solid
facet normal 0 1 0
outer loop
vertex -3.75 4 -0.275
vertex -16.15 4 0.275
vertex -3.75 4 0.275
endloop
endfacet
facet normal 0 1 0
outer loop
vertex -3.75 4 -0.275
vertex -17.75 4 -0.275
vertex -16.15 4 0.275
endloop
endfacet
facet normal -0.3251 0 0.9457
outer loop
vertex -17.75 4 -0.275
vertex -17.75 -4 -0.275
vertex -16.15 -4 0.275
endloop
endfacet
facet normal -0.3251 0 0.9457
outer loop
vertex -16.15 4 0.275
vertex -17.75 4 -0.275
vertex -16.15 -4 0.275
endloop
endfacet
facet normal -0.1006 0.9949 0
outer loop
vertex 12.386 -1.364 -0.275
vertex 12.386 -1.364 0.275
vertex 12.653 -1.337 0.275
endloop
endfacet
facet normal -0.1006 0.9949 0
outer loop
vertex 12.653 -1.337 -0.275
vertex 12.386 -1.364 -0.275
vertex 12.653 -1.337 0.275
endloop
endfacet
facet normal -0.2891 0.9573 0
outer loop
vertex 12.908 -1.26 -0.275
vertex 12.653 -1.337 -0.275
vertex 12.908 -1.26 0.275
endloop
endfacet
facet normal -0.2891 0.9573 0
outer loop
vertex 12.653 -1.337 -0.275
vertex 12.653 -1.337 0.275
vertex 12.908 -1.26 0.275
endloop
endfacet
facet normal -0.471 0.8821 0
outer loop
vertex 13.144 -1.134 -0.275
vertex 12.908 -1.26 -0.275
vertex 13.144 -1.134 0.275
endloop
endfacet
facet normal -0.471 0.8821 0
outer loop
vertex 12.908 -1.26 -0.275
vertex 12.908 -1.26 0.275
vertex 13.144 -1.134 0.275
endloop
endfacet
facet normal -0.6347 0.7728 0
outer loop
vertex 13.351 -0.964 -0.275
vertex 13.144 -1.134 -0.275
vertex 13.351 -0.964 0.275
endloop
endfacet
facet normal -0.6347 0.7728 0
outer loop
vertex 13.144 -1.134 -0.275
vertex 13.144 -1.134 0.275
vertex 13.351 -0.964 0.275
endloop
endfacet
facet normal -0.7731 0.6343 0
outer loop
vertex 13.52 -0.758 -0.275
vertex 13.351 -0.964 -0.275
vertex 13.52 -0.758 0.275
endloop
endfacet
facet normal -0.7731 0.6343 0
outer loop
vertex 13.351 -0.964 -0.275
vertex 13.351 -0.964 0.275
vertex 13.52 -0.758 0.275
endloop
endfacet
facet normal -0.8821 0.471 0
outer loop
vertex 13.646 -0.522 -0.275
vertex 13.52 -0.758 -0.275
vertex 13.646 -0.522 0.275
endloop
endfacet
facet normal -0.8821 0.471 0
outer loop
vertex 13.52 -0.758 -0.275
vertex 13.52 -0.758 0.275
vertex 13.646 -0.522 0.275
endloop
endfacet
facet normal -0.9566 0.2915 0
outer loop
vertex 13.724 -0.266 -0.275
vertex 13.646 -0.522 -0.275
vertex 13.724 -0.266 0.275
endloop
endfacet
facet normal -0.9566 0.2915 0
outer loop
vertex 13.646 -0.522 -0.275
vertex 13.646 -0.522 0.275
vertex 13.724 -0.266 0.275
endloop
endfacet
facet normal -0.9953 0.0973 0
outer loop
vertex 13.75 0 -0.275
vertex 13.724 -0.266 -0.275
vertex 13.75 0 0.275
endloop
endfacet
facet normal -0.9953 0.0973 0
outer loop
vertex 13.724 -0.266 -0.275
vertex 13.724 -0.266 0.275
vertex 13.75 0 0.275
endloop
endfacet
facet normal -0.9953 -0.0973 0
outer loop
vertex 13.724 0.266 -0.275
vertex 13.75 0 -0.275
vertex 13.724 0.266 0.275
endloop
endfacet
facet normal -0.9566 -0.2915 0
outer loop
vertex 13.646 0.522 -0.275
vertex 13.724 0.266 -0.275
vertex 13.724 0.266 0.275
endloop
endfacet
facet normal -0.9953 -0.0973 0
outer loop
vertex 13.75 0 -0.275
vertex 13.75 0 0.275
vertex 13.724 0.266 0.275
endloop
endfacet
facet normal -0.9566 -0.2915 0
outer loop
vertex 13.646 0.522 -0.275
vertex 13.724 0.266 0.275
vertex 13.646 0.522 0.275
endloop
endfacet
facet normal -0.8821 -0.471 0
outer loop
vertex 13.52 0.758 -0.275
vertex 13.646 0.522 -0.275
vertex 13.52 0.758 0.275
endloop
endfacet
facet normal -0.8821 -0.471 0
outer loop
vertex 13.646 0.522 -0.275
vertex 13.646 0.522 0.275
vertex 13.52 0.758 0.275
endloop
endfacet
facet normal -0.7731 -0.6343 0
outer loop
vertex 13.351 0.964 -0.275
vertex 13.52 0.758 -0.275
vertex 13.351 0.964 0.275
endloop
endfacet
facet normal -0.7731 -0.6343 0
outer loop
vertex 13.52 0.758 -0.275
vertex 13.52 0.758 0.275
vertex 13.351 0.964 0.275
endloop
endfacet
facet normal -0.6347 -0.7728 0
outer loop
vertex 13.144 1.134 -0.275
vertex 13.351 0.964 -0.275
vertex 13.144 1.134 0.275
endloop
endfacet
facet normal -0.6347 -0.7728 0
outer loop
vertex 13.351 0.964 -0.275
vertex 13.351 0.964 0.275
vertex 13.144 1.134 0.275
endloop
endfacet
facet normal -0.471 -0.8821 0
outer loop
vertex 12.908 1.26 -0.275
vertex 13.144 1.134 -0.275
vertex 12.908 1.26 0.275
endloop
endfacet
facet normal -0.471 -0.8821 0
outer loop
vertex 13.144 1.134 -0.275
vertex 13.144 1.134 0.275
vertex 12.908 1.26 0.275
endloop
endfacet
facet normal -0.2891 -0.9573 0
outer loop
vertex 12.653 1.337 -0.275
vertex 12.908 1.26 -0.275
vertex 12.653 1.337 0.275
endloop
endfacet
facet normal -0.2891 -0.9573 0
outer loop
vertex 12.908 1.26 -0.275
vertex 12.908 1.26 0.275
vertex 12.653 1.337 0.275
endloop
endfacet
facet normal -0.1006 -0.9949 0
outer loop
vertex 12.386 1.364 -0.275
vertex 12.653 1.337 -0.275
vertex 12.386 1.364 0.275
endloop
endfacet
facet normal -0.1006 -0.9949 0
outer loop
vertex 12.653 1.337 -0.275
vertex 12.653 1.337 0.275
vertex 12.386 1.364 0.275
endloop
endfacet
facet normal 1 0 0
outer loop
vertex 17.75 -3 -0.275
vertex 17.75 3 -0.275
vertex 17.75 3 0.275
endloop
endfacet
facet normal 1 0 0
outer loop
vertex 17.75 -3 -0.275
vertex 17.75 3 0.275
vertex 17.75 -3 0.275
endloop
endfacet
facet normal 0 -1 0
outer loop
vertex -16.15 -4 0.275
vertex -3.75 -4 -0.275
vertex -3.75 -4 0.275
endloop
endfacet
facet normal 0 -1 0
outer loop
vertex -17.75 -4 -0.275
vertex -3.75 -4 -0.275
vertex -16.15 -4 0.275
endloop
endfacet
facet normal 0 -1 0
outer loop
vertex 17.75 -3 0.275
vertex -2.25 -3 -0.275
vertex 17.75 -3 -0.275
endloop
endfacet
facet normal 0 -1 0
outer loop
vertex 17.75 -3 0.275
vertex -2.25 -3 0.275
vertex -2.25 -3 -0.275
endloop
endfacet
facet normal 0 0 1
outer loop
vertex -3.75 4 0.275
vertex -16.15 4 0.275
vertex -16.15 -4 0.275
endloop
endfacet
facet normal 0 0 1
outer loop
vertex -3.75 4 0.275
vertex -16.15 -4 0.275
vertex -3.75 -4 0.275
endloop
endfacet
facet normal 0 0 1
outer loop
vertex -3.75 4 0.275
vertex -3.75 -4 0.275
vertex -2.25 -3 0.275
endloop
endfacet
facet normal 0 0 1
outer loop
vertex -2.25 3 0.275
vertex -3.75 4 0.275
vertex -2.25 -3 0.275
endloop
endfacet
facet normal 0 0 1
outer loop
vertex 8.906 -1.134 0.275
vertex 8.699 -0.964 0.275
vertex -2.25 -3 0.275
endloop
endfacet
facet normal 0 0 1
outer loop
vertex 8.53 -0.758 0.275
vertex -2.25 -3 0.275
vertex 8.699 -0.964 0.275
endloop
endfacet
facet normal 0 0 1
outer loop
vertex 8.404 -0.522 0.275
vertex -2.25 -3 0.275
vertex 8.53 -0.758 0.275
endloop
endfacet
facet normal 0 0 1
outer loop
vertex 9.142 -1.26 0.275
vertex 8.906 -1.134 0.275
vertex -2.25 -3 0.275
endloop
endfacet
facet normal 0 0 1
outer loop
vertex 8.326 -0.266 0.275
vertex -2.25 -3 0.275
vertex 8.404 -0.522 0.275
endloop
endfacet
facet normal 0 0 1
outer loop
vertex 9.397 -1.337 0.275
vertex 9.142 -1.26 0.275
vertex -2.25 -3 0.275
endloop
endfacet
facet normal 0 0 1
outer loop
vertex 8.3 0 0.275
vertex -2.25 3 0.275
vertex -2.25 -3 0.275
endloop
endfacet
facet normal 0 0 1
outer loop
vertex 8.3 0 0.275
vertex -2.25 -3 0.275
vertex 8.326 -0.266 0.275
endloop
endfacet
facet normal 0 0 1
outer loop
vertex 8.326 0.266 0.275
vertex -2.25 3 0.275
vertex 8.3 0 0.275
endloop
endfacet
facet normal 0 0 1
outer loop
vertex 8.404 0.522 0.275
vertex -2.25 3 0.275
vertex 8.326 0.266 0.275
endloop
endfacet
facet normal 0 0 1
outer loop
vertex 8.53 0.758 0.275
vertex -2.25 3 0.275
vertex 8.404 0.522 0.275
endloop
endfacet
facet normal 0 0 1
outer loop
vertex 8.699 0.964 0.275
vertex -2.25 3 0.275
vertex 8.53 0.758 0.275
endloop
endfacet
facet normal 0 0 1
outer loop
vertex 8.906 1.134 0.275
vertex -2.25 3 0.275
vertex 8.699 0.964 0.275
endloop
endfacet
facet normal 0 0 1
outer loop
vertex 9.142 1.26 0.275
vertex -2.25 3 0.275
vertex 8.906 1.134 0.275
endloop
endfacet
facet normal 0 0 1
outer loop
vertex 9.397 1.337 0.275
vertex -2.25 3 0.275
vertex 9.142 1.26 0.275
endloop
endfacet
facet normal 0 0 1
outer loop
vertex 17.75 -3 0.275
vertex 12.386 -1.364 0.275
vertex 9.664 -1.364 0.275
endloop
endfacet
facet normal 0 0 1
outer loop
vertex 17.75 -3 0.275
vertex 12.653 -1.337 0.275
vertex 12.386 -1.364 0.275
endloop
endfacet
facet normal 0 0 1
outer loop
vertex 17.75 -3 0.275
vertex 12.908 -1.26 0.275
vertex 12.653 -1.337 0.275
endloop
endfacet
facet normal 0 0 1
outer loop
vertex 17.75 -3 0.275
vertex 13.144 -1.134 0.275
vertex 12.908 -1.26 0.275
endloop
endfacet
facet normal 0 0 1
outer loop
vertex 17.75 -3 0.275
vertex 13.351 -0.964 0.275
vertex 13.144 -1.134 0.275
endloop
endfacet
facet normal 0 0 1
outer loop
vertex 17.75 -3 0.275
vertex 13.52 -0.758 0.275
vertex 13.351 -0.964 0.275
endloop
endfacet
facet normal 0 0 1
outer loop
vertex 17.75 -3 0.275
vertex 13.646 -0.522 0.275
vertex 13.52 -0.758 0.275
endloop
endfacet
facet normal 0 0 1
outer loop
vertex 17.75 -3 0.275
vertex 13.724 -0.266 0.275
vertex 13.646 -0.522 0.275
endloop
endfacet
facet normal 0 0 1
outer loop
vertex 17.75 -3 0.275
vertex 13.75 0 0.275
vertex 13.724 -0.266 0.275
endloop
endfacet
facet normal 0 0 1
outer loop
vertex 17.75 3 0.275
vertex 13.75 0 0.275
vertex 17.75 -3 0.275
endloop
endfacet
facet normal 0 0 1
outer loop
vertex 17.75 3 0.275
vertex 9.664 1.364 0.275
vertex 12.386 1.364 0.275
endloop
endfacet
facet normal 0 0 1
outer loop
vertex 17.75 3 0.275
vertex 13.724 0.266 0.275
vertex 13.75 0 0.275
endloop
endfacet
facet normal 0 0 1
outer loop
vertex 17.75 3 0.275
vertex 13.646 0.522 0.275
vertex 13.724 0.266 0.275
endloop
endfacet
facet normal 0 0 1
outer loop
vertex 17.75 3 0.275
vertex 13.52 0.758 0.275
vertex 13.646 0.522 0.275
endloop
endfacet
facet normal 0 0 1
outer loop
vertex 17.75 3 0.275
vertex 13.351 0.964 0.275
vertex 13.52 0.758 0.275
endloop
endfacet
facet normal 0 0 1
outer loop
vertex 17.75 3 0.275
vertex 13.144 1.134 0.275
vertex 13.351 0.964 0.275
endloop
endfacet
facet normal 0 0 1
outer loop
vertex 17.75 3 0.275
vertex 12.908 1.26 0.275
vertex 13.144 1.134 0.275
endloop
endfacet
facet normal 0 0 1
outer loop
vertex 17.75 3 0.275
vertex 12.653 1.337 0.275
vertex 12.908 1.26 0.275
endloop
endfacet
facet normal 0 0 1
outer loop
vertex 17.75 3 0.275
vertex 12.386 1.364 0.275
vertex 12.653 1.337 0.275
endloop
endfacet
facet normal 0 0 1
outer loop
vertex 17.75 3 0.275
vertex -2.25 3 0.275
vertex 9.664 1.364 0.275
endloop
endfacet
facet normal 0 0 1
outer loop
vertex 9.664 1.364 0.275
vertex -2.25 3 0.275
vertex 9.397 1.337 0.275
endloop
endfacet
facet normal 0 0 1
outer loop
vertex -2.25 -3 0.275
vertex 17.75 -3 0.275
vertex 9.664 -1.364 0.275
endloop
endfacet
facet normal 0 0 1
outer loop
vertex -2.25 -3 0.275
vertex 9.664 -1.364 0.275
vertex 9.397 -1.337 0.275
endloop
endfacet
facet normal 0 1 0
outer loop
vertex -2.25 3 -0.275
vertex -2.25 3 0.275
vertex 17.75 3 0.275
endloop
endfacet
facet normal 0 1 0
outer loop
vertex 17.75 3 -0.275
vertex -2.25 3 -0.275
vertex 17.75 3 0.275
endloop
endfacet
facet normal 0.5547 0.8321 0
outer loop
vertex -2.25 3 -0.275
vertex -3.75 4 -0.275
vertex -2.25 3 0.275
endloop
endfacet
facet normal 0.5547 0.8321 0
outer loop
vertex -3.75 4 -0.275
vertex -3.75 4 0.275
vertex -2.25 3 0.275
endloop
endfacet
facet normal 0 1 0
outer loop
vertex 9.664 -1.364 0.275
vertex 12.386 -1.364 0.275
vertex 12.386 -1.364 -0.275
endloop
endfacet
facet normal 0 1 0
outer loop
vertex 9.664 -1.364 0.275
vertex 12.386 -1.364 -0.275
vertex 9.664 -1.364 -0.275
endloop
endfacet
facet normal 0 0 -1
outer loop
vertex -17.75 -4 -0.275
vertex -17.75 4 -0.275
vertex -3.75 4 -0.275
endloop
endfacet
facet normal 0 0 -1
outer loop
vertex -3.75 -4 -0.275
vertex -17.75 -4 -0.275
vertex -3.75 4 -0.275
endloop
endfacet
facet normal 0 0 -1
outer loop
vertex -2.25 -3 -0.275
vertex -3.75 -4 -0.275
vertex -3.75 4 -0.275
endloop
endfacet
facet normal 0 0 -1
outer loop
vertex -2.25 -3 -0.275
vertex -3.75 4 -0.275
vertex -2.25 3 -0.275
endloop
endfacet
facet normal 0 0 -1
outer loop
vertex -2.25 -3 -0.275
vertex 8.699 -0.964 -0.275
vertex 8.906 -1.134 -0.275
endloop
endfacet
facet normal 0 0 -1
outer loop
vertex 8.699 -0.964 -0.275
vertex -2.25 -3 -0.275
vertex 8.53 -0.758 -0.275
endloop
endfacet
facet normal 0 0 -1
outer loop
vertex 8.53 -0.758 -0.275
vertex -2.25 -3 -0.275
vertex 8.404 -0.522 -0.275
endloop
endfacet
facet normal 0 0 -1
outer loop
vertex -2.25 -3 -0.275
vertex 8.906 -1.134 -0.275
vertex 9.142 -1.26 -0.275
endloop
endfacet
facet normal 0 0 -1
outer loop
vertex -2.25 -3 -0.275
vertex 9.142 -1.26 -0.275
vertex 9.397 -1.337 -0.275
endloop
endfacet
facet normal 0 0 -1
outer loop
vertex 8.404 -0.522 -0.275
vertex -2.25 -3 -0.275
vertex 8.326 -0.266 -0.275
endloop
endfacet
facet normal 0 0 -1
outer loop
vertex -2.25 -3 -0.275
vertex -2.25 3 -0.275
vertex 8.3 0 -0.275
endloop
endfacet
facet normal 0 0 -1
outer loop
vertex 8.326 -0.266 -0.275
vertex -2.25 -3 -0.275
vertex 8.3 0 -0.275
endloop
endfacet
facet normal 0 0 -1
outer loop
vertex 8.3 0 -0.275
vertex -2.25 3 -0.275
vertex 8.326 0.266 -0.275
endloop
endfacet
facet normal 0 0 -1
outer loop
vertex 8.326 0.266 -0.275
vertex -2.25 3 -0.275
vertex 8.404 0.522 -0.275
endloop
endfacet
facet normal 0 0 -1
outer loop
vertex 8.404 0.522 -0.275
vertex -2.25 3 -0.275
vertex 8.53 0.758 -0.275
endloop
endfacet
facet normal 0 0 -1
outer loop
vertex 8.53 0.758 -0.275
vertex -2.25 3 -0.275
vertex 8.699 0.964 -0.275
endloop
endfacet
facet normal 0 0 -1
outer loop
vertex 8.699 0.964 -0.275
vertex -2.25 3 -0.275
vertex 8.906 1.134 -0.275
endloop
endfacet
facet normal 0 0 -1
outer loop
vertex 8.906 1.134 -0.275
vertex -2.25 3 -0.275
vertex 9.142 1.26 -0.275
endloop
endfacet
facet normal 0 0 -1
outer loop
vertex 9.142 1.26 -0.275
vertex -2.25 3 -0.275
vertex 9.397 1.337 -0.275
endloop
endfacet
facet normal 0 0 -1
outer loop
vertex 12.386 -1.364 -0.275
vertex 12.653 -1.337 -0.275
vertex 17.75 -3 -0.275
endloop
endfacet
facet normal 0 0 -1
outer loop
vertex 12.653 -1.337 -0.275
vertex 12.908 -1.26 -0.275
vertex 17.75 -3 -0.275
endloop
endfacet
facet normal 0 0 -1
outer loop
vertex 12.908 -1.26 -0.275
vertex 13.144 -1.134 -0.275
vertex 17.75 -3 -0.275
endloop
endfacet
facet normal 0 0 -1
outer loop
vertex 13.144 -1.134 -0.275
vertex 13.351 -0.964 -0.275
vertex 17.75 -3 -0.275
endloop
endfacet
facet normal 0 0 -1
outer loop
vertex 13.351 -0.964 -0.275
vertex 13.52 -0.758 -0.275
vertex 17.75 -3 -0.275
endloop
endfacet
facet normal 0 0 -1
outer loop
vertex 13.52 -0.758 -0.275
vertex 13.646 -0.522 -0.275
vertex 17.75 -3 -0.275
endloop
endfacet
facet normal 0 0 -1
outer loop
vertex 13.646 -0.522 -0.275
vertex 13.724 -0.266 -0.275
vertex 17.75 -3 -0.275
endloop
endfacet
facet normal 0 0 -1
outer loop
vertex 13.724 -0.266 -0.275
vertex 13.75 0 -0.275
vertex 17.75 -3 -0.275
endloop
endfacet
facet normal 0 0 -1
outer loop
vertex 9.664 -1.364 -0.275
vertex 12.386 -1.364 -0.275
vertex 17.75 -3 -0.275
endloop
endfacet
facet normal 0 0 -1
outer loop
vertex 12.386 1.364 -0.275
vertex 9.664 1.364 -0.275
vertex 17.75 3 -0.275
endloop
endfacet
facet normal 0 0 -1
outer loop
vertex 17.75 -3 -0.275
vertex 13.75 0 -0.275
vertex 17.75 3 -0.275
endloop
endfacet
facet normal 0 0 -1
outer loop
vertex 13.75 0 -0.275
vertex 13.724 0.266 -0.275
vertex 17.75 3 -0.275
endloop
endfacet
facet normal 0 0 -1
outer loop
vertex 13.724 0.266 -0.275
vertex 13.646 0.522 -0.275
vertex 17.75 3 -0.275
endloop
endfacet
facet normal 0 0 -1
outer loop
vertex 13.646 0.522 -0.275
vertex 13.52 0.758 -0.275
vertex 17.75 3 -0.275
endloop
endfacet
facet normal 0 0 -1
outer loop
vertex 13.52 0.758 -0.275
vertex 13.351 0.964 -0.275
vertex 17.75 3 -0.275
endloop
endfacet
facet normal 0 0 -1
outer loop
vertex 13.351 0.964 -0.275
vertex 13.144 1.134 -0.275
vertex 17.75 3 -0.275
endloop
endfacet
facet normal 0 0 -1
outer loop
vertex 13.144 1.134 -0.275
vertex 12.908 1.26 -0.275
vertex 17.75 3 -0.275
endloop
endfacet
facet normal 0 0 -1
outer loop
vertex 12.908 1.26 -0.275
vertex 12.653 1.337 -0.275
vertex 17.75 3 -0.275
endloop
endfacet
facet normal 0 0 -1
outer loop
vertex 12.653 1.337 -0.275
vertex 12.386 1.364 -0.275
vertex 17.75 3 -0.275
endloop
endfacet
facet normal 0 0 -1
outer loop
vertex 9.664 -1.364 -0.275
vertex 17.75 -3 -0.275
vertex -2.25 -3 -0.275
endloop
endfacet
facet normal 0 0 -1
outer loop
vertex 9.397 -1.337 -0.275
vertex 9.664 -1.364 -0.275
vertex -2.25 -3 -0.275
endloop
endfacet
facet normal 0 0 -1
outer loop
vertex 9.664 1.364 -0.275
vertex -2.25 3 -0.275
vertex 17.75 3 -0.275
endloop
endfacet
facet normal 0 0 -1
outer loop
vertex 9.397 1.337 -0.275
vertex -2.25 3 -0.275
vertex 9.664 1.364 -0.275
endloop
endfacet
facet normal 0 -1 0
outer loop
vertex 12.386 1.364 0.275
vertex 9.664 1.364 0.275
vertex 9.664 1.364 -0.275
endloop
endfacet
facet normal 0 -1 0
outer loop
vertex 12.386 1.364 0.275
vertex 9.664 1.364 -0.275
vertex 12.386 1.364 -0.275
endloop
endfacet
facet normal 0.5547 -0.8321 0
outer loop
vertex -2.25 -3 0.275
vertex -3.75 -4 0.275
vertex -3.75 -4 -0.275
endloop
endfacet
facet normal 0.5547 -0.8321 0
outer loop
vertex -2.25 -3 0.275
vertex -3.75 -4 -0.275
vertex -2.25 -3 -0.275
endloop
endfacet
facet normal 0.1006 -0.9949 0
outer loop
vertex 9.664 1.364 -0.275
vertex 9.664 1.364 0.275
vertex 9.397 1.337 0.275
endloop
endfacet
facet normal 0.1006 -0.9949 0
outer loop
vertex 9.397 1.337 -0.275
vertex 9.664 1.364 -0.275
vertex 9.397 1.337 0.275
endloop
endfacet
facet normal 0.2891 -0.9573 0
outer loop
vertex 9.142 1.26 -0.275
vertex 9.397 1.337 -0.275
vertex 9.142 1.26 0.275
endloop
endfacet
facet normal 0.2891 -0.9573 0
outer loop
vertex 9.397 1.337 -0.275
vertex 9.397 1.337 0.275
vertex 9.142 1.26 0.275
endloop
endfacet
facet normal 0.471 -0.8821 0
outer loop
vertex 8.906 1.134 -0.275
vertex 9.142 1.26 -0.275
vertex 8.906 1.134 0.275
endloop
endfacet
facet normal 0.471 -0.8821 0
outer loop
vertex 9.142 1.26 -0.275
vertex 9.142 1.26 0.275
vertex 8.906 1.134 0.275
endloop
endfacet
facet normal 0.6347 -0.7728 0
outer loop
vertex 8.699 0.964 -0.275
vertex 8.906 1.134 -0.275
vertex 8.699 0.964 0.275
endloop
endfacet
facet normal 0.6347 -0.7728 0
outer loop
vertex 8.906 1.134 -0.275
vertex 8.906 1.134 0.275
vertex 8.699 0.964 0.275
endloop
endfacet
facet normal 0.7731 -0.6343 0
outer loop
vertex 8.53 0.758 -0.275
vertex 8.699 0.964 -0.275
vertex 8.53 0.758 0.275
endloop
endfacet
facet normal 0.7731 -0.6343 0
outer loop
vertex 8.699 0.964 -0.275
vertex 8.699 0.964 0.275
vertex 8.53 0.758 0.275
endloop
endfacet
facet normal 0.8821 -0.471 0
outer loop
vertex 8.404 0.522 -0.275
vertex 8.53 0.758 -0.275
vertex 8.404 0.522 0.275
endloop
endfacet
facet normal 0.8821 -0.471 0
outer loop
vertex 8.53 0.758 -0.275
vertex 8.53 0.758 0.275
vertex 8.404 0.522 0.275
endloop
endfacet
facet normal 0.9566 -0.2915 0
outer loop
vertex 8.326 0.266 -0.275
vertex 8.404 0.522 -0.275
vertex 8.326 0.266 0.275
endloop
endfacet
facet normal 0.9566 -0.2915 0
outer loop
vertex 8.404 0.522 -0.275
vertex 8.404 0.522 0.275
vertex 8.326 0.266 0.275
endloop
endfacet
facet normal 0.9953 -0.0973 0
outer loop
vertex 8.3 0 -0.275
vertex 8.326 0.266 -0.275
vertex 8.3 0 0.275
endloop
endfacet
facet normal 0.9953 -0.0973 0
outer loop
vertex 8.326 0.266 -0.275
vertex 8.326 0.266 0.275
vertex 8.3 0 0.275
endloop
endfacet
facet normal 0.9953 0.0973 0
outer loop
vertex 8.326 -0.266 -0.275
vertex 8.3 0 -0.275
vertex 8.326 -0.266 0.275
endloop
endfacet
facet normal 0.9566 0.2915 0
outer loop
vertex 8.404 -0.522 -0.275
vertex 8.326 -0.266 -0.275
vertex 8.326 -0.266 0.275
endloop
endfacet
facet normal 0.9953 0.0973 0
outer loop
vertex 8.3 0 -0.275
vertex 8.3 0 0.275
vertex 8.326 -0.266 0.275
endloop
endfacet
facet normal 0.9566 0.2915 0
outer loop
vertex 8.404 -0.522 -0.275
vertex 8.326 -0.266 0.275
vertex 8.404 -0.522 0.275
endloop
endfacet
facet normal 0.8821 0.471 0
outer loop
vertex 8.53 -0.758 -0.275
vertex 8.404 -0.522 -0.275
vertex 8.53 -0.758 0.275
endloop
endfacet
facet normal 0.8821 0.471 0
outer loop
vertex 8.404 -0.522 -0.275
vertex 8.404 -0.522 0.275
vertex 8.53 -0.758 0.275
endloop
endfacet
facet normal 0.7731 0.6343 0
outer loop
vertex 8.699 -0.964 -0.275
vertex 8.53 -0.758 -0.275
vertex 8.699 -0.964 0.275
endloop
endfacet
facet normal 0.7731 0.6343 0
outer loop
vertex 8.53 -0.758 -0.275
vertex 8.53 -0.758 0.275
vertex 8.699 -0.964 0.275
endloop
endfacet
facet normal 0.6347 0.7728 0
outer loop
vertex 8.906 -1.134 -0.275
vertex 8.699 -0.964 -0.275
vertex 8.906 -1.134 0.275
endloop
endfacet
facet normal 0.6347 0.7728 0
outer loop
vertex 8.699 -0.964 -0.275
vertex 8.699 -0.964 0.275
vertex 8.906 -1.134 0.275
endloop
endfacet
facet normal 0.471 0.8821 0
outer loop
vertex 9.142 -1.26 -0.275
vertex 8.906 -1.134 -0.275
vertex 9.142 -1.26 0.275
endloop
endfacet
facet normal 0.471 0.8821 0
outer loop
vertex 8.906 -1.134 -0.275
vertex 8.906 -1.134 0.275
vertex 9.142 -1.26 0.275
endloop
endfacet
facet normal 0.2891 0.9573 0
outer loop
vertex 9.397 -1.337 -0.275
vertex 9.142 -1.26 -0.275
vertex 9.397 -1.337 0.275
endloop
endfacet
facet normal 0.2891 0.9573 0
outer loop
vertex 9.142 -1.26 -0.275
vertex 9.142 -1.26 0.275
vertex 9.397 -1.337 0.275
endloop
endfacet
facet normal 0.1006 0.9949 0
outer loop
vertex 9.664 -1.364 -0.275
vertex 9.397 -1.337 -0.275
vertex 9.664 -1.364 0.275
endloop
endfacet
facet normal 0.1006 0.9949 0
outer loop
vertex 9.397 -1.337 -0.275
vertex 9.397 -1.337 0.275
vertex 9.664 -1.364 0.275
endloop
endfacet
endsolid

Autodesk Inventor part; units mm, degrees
ref_plane "YZ Plane" through (0, 0, 0) normal (1, 0, 0) x (0, 1, 0)
ref_plane "XZ Plane" through (0, 0, 0) normal (0, 1, 0) x (-1, 0, 0)
ref_plane "XY Plane" through (0, 0, 0) normal (0, 0, 1) x (1, 0, 0)
sketch "スケッチ1" plane through (0, 0, 0) normal (0, 0, 1) x (1, 0, 0)
  line L0 (-17.75, 4) -> (17.75, 4)
  line L1 (17.75, 4) -> (17.75, -4)
  line L2 (17.75, -4) -> (-17.75, -4)
  line L3 (-17.75, -4) -> (-17.75, 4)
  line L4 (-17.75, 4) -> (17.75, -4) construction
  line L5 (17.75, 4) -> (-17.75, -4) construction
  point P0 (0, 0)
  dimension "d0" = 35.5
  dimension "d1" = 8
extrude "押し出し1" add sketch "スケッチ1" along normal mid plane 0.55
sketch "スケッチ2" plane through (0, 0, 0.275) normal (0, 0, 1) x (1, 0, 0)
  line L0 (9.6635, 0) -> (12.3865, 0) construction
  line L1 (9.6635, 1.3635) -> (12.3865, 1.3635)
  line L2 (12.3865, -1.3635) -> (9.6635, -1.3635)
  arc A0 (9.6635, 1.3635) -> (9.6635, -1.3635) centre (9.6635, 0) ccw
  arc A1 (12.3865, -1.3635) -> (12.3865, 1.3635) centre (12.3865, 0) ccw
  line L3 (17.75, -4) -> (17.75, 4) projected
  line L4 (17.75, 4) -> (-17.75, 4) projected
  point P0 (0, 0)
  point P1 (11.025, 0)
  point P2 (13.75, 0)
  point P3 (8.3, 0)
  dimension "d4" = 2.727
  dimension "d5" = 5.45
  dimension "d6" = 4
  dimension "d7" = 4
extrude "押し出し2" cut sketch "スケッチ2" against normal blind 0.55
sketch "スケッチ3" plane through (0, 0, 0.275) normal (0, 0, 1) x (1, 0, 0)
  line L0 (-17.75, 4) -> (17.75, 4) projected
  line L1 (17.75, 4) -> (17.75, -4) projected
  line L2 (-17.75, 4) -> (-17.75, -4) projected
  line L3 (-2.25, 3) -> (17.75, 3)
  line L4 (-3.75, 4) -> (-2.25, 3)
  line L5 (0, 0) -> (-1.8887, 0)
  line L6 (-2.25, -3) -> (17.75, -3)
  line L7 (-3.75, -4) -> (-2.25, -3)
  arc A0 (9.6635, 1.3635) -> (9.6635, -1.3635) centre (9.6635, 0) ccw projected
  line L8 (9.6635, 1.3635) -> (12.3865, 1.3635) projected
  arc A1 (12.3865, -1.3635) -> (12.3865, 1.3635) centre (12.3865, 0) ccw projected
  line L9 (12.3865, -1.3635) -> (9.6635, -1.3635) projected
  line L10 (-17.75, -4) -> (17.75, -4) projected
  line L11 (17.75, -4) -> (17.75, 4) projected
  line L12 (17.75, 4) -> (-17.75, 4) projected
  line L13 (-17.75, 4) -> (-17.75, -4) projected
  dimension "d10" = 1
  dimension "d11" = 14
  dimension "d12" = 20
extrude "押し出し3" cut sketch "スケッチ3" against normal blind 0.55 contours L0 L1 L3 L4 | L7 L6 L1 L10
sketch "スケッチ4" plane through (-17.75, -4, -0.275) normal (0, -1, 0) x (1, 0, 0)
  line L0 (0, 0.55) -> (14, 0.55) projected
  line L1 (0, 0.55) -> (0, 0) projected
  line L2 (0, 0) -> (1.6, 0.55)
  point P0 (17.75, 0.275)
  dimension "d15" = 1.6
extrude "押し出し4" cut sketch "スケッチ4" against normal through all
properties part number "pen_type_cutter"
